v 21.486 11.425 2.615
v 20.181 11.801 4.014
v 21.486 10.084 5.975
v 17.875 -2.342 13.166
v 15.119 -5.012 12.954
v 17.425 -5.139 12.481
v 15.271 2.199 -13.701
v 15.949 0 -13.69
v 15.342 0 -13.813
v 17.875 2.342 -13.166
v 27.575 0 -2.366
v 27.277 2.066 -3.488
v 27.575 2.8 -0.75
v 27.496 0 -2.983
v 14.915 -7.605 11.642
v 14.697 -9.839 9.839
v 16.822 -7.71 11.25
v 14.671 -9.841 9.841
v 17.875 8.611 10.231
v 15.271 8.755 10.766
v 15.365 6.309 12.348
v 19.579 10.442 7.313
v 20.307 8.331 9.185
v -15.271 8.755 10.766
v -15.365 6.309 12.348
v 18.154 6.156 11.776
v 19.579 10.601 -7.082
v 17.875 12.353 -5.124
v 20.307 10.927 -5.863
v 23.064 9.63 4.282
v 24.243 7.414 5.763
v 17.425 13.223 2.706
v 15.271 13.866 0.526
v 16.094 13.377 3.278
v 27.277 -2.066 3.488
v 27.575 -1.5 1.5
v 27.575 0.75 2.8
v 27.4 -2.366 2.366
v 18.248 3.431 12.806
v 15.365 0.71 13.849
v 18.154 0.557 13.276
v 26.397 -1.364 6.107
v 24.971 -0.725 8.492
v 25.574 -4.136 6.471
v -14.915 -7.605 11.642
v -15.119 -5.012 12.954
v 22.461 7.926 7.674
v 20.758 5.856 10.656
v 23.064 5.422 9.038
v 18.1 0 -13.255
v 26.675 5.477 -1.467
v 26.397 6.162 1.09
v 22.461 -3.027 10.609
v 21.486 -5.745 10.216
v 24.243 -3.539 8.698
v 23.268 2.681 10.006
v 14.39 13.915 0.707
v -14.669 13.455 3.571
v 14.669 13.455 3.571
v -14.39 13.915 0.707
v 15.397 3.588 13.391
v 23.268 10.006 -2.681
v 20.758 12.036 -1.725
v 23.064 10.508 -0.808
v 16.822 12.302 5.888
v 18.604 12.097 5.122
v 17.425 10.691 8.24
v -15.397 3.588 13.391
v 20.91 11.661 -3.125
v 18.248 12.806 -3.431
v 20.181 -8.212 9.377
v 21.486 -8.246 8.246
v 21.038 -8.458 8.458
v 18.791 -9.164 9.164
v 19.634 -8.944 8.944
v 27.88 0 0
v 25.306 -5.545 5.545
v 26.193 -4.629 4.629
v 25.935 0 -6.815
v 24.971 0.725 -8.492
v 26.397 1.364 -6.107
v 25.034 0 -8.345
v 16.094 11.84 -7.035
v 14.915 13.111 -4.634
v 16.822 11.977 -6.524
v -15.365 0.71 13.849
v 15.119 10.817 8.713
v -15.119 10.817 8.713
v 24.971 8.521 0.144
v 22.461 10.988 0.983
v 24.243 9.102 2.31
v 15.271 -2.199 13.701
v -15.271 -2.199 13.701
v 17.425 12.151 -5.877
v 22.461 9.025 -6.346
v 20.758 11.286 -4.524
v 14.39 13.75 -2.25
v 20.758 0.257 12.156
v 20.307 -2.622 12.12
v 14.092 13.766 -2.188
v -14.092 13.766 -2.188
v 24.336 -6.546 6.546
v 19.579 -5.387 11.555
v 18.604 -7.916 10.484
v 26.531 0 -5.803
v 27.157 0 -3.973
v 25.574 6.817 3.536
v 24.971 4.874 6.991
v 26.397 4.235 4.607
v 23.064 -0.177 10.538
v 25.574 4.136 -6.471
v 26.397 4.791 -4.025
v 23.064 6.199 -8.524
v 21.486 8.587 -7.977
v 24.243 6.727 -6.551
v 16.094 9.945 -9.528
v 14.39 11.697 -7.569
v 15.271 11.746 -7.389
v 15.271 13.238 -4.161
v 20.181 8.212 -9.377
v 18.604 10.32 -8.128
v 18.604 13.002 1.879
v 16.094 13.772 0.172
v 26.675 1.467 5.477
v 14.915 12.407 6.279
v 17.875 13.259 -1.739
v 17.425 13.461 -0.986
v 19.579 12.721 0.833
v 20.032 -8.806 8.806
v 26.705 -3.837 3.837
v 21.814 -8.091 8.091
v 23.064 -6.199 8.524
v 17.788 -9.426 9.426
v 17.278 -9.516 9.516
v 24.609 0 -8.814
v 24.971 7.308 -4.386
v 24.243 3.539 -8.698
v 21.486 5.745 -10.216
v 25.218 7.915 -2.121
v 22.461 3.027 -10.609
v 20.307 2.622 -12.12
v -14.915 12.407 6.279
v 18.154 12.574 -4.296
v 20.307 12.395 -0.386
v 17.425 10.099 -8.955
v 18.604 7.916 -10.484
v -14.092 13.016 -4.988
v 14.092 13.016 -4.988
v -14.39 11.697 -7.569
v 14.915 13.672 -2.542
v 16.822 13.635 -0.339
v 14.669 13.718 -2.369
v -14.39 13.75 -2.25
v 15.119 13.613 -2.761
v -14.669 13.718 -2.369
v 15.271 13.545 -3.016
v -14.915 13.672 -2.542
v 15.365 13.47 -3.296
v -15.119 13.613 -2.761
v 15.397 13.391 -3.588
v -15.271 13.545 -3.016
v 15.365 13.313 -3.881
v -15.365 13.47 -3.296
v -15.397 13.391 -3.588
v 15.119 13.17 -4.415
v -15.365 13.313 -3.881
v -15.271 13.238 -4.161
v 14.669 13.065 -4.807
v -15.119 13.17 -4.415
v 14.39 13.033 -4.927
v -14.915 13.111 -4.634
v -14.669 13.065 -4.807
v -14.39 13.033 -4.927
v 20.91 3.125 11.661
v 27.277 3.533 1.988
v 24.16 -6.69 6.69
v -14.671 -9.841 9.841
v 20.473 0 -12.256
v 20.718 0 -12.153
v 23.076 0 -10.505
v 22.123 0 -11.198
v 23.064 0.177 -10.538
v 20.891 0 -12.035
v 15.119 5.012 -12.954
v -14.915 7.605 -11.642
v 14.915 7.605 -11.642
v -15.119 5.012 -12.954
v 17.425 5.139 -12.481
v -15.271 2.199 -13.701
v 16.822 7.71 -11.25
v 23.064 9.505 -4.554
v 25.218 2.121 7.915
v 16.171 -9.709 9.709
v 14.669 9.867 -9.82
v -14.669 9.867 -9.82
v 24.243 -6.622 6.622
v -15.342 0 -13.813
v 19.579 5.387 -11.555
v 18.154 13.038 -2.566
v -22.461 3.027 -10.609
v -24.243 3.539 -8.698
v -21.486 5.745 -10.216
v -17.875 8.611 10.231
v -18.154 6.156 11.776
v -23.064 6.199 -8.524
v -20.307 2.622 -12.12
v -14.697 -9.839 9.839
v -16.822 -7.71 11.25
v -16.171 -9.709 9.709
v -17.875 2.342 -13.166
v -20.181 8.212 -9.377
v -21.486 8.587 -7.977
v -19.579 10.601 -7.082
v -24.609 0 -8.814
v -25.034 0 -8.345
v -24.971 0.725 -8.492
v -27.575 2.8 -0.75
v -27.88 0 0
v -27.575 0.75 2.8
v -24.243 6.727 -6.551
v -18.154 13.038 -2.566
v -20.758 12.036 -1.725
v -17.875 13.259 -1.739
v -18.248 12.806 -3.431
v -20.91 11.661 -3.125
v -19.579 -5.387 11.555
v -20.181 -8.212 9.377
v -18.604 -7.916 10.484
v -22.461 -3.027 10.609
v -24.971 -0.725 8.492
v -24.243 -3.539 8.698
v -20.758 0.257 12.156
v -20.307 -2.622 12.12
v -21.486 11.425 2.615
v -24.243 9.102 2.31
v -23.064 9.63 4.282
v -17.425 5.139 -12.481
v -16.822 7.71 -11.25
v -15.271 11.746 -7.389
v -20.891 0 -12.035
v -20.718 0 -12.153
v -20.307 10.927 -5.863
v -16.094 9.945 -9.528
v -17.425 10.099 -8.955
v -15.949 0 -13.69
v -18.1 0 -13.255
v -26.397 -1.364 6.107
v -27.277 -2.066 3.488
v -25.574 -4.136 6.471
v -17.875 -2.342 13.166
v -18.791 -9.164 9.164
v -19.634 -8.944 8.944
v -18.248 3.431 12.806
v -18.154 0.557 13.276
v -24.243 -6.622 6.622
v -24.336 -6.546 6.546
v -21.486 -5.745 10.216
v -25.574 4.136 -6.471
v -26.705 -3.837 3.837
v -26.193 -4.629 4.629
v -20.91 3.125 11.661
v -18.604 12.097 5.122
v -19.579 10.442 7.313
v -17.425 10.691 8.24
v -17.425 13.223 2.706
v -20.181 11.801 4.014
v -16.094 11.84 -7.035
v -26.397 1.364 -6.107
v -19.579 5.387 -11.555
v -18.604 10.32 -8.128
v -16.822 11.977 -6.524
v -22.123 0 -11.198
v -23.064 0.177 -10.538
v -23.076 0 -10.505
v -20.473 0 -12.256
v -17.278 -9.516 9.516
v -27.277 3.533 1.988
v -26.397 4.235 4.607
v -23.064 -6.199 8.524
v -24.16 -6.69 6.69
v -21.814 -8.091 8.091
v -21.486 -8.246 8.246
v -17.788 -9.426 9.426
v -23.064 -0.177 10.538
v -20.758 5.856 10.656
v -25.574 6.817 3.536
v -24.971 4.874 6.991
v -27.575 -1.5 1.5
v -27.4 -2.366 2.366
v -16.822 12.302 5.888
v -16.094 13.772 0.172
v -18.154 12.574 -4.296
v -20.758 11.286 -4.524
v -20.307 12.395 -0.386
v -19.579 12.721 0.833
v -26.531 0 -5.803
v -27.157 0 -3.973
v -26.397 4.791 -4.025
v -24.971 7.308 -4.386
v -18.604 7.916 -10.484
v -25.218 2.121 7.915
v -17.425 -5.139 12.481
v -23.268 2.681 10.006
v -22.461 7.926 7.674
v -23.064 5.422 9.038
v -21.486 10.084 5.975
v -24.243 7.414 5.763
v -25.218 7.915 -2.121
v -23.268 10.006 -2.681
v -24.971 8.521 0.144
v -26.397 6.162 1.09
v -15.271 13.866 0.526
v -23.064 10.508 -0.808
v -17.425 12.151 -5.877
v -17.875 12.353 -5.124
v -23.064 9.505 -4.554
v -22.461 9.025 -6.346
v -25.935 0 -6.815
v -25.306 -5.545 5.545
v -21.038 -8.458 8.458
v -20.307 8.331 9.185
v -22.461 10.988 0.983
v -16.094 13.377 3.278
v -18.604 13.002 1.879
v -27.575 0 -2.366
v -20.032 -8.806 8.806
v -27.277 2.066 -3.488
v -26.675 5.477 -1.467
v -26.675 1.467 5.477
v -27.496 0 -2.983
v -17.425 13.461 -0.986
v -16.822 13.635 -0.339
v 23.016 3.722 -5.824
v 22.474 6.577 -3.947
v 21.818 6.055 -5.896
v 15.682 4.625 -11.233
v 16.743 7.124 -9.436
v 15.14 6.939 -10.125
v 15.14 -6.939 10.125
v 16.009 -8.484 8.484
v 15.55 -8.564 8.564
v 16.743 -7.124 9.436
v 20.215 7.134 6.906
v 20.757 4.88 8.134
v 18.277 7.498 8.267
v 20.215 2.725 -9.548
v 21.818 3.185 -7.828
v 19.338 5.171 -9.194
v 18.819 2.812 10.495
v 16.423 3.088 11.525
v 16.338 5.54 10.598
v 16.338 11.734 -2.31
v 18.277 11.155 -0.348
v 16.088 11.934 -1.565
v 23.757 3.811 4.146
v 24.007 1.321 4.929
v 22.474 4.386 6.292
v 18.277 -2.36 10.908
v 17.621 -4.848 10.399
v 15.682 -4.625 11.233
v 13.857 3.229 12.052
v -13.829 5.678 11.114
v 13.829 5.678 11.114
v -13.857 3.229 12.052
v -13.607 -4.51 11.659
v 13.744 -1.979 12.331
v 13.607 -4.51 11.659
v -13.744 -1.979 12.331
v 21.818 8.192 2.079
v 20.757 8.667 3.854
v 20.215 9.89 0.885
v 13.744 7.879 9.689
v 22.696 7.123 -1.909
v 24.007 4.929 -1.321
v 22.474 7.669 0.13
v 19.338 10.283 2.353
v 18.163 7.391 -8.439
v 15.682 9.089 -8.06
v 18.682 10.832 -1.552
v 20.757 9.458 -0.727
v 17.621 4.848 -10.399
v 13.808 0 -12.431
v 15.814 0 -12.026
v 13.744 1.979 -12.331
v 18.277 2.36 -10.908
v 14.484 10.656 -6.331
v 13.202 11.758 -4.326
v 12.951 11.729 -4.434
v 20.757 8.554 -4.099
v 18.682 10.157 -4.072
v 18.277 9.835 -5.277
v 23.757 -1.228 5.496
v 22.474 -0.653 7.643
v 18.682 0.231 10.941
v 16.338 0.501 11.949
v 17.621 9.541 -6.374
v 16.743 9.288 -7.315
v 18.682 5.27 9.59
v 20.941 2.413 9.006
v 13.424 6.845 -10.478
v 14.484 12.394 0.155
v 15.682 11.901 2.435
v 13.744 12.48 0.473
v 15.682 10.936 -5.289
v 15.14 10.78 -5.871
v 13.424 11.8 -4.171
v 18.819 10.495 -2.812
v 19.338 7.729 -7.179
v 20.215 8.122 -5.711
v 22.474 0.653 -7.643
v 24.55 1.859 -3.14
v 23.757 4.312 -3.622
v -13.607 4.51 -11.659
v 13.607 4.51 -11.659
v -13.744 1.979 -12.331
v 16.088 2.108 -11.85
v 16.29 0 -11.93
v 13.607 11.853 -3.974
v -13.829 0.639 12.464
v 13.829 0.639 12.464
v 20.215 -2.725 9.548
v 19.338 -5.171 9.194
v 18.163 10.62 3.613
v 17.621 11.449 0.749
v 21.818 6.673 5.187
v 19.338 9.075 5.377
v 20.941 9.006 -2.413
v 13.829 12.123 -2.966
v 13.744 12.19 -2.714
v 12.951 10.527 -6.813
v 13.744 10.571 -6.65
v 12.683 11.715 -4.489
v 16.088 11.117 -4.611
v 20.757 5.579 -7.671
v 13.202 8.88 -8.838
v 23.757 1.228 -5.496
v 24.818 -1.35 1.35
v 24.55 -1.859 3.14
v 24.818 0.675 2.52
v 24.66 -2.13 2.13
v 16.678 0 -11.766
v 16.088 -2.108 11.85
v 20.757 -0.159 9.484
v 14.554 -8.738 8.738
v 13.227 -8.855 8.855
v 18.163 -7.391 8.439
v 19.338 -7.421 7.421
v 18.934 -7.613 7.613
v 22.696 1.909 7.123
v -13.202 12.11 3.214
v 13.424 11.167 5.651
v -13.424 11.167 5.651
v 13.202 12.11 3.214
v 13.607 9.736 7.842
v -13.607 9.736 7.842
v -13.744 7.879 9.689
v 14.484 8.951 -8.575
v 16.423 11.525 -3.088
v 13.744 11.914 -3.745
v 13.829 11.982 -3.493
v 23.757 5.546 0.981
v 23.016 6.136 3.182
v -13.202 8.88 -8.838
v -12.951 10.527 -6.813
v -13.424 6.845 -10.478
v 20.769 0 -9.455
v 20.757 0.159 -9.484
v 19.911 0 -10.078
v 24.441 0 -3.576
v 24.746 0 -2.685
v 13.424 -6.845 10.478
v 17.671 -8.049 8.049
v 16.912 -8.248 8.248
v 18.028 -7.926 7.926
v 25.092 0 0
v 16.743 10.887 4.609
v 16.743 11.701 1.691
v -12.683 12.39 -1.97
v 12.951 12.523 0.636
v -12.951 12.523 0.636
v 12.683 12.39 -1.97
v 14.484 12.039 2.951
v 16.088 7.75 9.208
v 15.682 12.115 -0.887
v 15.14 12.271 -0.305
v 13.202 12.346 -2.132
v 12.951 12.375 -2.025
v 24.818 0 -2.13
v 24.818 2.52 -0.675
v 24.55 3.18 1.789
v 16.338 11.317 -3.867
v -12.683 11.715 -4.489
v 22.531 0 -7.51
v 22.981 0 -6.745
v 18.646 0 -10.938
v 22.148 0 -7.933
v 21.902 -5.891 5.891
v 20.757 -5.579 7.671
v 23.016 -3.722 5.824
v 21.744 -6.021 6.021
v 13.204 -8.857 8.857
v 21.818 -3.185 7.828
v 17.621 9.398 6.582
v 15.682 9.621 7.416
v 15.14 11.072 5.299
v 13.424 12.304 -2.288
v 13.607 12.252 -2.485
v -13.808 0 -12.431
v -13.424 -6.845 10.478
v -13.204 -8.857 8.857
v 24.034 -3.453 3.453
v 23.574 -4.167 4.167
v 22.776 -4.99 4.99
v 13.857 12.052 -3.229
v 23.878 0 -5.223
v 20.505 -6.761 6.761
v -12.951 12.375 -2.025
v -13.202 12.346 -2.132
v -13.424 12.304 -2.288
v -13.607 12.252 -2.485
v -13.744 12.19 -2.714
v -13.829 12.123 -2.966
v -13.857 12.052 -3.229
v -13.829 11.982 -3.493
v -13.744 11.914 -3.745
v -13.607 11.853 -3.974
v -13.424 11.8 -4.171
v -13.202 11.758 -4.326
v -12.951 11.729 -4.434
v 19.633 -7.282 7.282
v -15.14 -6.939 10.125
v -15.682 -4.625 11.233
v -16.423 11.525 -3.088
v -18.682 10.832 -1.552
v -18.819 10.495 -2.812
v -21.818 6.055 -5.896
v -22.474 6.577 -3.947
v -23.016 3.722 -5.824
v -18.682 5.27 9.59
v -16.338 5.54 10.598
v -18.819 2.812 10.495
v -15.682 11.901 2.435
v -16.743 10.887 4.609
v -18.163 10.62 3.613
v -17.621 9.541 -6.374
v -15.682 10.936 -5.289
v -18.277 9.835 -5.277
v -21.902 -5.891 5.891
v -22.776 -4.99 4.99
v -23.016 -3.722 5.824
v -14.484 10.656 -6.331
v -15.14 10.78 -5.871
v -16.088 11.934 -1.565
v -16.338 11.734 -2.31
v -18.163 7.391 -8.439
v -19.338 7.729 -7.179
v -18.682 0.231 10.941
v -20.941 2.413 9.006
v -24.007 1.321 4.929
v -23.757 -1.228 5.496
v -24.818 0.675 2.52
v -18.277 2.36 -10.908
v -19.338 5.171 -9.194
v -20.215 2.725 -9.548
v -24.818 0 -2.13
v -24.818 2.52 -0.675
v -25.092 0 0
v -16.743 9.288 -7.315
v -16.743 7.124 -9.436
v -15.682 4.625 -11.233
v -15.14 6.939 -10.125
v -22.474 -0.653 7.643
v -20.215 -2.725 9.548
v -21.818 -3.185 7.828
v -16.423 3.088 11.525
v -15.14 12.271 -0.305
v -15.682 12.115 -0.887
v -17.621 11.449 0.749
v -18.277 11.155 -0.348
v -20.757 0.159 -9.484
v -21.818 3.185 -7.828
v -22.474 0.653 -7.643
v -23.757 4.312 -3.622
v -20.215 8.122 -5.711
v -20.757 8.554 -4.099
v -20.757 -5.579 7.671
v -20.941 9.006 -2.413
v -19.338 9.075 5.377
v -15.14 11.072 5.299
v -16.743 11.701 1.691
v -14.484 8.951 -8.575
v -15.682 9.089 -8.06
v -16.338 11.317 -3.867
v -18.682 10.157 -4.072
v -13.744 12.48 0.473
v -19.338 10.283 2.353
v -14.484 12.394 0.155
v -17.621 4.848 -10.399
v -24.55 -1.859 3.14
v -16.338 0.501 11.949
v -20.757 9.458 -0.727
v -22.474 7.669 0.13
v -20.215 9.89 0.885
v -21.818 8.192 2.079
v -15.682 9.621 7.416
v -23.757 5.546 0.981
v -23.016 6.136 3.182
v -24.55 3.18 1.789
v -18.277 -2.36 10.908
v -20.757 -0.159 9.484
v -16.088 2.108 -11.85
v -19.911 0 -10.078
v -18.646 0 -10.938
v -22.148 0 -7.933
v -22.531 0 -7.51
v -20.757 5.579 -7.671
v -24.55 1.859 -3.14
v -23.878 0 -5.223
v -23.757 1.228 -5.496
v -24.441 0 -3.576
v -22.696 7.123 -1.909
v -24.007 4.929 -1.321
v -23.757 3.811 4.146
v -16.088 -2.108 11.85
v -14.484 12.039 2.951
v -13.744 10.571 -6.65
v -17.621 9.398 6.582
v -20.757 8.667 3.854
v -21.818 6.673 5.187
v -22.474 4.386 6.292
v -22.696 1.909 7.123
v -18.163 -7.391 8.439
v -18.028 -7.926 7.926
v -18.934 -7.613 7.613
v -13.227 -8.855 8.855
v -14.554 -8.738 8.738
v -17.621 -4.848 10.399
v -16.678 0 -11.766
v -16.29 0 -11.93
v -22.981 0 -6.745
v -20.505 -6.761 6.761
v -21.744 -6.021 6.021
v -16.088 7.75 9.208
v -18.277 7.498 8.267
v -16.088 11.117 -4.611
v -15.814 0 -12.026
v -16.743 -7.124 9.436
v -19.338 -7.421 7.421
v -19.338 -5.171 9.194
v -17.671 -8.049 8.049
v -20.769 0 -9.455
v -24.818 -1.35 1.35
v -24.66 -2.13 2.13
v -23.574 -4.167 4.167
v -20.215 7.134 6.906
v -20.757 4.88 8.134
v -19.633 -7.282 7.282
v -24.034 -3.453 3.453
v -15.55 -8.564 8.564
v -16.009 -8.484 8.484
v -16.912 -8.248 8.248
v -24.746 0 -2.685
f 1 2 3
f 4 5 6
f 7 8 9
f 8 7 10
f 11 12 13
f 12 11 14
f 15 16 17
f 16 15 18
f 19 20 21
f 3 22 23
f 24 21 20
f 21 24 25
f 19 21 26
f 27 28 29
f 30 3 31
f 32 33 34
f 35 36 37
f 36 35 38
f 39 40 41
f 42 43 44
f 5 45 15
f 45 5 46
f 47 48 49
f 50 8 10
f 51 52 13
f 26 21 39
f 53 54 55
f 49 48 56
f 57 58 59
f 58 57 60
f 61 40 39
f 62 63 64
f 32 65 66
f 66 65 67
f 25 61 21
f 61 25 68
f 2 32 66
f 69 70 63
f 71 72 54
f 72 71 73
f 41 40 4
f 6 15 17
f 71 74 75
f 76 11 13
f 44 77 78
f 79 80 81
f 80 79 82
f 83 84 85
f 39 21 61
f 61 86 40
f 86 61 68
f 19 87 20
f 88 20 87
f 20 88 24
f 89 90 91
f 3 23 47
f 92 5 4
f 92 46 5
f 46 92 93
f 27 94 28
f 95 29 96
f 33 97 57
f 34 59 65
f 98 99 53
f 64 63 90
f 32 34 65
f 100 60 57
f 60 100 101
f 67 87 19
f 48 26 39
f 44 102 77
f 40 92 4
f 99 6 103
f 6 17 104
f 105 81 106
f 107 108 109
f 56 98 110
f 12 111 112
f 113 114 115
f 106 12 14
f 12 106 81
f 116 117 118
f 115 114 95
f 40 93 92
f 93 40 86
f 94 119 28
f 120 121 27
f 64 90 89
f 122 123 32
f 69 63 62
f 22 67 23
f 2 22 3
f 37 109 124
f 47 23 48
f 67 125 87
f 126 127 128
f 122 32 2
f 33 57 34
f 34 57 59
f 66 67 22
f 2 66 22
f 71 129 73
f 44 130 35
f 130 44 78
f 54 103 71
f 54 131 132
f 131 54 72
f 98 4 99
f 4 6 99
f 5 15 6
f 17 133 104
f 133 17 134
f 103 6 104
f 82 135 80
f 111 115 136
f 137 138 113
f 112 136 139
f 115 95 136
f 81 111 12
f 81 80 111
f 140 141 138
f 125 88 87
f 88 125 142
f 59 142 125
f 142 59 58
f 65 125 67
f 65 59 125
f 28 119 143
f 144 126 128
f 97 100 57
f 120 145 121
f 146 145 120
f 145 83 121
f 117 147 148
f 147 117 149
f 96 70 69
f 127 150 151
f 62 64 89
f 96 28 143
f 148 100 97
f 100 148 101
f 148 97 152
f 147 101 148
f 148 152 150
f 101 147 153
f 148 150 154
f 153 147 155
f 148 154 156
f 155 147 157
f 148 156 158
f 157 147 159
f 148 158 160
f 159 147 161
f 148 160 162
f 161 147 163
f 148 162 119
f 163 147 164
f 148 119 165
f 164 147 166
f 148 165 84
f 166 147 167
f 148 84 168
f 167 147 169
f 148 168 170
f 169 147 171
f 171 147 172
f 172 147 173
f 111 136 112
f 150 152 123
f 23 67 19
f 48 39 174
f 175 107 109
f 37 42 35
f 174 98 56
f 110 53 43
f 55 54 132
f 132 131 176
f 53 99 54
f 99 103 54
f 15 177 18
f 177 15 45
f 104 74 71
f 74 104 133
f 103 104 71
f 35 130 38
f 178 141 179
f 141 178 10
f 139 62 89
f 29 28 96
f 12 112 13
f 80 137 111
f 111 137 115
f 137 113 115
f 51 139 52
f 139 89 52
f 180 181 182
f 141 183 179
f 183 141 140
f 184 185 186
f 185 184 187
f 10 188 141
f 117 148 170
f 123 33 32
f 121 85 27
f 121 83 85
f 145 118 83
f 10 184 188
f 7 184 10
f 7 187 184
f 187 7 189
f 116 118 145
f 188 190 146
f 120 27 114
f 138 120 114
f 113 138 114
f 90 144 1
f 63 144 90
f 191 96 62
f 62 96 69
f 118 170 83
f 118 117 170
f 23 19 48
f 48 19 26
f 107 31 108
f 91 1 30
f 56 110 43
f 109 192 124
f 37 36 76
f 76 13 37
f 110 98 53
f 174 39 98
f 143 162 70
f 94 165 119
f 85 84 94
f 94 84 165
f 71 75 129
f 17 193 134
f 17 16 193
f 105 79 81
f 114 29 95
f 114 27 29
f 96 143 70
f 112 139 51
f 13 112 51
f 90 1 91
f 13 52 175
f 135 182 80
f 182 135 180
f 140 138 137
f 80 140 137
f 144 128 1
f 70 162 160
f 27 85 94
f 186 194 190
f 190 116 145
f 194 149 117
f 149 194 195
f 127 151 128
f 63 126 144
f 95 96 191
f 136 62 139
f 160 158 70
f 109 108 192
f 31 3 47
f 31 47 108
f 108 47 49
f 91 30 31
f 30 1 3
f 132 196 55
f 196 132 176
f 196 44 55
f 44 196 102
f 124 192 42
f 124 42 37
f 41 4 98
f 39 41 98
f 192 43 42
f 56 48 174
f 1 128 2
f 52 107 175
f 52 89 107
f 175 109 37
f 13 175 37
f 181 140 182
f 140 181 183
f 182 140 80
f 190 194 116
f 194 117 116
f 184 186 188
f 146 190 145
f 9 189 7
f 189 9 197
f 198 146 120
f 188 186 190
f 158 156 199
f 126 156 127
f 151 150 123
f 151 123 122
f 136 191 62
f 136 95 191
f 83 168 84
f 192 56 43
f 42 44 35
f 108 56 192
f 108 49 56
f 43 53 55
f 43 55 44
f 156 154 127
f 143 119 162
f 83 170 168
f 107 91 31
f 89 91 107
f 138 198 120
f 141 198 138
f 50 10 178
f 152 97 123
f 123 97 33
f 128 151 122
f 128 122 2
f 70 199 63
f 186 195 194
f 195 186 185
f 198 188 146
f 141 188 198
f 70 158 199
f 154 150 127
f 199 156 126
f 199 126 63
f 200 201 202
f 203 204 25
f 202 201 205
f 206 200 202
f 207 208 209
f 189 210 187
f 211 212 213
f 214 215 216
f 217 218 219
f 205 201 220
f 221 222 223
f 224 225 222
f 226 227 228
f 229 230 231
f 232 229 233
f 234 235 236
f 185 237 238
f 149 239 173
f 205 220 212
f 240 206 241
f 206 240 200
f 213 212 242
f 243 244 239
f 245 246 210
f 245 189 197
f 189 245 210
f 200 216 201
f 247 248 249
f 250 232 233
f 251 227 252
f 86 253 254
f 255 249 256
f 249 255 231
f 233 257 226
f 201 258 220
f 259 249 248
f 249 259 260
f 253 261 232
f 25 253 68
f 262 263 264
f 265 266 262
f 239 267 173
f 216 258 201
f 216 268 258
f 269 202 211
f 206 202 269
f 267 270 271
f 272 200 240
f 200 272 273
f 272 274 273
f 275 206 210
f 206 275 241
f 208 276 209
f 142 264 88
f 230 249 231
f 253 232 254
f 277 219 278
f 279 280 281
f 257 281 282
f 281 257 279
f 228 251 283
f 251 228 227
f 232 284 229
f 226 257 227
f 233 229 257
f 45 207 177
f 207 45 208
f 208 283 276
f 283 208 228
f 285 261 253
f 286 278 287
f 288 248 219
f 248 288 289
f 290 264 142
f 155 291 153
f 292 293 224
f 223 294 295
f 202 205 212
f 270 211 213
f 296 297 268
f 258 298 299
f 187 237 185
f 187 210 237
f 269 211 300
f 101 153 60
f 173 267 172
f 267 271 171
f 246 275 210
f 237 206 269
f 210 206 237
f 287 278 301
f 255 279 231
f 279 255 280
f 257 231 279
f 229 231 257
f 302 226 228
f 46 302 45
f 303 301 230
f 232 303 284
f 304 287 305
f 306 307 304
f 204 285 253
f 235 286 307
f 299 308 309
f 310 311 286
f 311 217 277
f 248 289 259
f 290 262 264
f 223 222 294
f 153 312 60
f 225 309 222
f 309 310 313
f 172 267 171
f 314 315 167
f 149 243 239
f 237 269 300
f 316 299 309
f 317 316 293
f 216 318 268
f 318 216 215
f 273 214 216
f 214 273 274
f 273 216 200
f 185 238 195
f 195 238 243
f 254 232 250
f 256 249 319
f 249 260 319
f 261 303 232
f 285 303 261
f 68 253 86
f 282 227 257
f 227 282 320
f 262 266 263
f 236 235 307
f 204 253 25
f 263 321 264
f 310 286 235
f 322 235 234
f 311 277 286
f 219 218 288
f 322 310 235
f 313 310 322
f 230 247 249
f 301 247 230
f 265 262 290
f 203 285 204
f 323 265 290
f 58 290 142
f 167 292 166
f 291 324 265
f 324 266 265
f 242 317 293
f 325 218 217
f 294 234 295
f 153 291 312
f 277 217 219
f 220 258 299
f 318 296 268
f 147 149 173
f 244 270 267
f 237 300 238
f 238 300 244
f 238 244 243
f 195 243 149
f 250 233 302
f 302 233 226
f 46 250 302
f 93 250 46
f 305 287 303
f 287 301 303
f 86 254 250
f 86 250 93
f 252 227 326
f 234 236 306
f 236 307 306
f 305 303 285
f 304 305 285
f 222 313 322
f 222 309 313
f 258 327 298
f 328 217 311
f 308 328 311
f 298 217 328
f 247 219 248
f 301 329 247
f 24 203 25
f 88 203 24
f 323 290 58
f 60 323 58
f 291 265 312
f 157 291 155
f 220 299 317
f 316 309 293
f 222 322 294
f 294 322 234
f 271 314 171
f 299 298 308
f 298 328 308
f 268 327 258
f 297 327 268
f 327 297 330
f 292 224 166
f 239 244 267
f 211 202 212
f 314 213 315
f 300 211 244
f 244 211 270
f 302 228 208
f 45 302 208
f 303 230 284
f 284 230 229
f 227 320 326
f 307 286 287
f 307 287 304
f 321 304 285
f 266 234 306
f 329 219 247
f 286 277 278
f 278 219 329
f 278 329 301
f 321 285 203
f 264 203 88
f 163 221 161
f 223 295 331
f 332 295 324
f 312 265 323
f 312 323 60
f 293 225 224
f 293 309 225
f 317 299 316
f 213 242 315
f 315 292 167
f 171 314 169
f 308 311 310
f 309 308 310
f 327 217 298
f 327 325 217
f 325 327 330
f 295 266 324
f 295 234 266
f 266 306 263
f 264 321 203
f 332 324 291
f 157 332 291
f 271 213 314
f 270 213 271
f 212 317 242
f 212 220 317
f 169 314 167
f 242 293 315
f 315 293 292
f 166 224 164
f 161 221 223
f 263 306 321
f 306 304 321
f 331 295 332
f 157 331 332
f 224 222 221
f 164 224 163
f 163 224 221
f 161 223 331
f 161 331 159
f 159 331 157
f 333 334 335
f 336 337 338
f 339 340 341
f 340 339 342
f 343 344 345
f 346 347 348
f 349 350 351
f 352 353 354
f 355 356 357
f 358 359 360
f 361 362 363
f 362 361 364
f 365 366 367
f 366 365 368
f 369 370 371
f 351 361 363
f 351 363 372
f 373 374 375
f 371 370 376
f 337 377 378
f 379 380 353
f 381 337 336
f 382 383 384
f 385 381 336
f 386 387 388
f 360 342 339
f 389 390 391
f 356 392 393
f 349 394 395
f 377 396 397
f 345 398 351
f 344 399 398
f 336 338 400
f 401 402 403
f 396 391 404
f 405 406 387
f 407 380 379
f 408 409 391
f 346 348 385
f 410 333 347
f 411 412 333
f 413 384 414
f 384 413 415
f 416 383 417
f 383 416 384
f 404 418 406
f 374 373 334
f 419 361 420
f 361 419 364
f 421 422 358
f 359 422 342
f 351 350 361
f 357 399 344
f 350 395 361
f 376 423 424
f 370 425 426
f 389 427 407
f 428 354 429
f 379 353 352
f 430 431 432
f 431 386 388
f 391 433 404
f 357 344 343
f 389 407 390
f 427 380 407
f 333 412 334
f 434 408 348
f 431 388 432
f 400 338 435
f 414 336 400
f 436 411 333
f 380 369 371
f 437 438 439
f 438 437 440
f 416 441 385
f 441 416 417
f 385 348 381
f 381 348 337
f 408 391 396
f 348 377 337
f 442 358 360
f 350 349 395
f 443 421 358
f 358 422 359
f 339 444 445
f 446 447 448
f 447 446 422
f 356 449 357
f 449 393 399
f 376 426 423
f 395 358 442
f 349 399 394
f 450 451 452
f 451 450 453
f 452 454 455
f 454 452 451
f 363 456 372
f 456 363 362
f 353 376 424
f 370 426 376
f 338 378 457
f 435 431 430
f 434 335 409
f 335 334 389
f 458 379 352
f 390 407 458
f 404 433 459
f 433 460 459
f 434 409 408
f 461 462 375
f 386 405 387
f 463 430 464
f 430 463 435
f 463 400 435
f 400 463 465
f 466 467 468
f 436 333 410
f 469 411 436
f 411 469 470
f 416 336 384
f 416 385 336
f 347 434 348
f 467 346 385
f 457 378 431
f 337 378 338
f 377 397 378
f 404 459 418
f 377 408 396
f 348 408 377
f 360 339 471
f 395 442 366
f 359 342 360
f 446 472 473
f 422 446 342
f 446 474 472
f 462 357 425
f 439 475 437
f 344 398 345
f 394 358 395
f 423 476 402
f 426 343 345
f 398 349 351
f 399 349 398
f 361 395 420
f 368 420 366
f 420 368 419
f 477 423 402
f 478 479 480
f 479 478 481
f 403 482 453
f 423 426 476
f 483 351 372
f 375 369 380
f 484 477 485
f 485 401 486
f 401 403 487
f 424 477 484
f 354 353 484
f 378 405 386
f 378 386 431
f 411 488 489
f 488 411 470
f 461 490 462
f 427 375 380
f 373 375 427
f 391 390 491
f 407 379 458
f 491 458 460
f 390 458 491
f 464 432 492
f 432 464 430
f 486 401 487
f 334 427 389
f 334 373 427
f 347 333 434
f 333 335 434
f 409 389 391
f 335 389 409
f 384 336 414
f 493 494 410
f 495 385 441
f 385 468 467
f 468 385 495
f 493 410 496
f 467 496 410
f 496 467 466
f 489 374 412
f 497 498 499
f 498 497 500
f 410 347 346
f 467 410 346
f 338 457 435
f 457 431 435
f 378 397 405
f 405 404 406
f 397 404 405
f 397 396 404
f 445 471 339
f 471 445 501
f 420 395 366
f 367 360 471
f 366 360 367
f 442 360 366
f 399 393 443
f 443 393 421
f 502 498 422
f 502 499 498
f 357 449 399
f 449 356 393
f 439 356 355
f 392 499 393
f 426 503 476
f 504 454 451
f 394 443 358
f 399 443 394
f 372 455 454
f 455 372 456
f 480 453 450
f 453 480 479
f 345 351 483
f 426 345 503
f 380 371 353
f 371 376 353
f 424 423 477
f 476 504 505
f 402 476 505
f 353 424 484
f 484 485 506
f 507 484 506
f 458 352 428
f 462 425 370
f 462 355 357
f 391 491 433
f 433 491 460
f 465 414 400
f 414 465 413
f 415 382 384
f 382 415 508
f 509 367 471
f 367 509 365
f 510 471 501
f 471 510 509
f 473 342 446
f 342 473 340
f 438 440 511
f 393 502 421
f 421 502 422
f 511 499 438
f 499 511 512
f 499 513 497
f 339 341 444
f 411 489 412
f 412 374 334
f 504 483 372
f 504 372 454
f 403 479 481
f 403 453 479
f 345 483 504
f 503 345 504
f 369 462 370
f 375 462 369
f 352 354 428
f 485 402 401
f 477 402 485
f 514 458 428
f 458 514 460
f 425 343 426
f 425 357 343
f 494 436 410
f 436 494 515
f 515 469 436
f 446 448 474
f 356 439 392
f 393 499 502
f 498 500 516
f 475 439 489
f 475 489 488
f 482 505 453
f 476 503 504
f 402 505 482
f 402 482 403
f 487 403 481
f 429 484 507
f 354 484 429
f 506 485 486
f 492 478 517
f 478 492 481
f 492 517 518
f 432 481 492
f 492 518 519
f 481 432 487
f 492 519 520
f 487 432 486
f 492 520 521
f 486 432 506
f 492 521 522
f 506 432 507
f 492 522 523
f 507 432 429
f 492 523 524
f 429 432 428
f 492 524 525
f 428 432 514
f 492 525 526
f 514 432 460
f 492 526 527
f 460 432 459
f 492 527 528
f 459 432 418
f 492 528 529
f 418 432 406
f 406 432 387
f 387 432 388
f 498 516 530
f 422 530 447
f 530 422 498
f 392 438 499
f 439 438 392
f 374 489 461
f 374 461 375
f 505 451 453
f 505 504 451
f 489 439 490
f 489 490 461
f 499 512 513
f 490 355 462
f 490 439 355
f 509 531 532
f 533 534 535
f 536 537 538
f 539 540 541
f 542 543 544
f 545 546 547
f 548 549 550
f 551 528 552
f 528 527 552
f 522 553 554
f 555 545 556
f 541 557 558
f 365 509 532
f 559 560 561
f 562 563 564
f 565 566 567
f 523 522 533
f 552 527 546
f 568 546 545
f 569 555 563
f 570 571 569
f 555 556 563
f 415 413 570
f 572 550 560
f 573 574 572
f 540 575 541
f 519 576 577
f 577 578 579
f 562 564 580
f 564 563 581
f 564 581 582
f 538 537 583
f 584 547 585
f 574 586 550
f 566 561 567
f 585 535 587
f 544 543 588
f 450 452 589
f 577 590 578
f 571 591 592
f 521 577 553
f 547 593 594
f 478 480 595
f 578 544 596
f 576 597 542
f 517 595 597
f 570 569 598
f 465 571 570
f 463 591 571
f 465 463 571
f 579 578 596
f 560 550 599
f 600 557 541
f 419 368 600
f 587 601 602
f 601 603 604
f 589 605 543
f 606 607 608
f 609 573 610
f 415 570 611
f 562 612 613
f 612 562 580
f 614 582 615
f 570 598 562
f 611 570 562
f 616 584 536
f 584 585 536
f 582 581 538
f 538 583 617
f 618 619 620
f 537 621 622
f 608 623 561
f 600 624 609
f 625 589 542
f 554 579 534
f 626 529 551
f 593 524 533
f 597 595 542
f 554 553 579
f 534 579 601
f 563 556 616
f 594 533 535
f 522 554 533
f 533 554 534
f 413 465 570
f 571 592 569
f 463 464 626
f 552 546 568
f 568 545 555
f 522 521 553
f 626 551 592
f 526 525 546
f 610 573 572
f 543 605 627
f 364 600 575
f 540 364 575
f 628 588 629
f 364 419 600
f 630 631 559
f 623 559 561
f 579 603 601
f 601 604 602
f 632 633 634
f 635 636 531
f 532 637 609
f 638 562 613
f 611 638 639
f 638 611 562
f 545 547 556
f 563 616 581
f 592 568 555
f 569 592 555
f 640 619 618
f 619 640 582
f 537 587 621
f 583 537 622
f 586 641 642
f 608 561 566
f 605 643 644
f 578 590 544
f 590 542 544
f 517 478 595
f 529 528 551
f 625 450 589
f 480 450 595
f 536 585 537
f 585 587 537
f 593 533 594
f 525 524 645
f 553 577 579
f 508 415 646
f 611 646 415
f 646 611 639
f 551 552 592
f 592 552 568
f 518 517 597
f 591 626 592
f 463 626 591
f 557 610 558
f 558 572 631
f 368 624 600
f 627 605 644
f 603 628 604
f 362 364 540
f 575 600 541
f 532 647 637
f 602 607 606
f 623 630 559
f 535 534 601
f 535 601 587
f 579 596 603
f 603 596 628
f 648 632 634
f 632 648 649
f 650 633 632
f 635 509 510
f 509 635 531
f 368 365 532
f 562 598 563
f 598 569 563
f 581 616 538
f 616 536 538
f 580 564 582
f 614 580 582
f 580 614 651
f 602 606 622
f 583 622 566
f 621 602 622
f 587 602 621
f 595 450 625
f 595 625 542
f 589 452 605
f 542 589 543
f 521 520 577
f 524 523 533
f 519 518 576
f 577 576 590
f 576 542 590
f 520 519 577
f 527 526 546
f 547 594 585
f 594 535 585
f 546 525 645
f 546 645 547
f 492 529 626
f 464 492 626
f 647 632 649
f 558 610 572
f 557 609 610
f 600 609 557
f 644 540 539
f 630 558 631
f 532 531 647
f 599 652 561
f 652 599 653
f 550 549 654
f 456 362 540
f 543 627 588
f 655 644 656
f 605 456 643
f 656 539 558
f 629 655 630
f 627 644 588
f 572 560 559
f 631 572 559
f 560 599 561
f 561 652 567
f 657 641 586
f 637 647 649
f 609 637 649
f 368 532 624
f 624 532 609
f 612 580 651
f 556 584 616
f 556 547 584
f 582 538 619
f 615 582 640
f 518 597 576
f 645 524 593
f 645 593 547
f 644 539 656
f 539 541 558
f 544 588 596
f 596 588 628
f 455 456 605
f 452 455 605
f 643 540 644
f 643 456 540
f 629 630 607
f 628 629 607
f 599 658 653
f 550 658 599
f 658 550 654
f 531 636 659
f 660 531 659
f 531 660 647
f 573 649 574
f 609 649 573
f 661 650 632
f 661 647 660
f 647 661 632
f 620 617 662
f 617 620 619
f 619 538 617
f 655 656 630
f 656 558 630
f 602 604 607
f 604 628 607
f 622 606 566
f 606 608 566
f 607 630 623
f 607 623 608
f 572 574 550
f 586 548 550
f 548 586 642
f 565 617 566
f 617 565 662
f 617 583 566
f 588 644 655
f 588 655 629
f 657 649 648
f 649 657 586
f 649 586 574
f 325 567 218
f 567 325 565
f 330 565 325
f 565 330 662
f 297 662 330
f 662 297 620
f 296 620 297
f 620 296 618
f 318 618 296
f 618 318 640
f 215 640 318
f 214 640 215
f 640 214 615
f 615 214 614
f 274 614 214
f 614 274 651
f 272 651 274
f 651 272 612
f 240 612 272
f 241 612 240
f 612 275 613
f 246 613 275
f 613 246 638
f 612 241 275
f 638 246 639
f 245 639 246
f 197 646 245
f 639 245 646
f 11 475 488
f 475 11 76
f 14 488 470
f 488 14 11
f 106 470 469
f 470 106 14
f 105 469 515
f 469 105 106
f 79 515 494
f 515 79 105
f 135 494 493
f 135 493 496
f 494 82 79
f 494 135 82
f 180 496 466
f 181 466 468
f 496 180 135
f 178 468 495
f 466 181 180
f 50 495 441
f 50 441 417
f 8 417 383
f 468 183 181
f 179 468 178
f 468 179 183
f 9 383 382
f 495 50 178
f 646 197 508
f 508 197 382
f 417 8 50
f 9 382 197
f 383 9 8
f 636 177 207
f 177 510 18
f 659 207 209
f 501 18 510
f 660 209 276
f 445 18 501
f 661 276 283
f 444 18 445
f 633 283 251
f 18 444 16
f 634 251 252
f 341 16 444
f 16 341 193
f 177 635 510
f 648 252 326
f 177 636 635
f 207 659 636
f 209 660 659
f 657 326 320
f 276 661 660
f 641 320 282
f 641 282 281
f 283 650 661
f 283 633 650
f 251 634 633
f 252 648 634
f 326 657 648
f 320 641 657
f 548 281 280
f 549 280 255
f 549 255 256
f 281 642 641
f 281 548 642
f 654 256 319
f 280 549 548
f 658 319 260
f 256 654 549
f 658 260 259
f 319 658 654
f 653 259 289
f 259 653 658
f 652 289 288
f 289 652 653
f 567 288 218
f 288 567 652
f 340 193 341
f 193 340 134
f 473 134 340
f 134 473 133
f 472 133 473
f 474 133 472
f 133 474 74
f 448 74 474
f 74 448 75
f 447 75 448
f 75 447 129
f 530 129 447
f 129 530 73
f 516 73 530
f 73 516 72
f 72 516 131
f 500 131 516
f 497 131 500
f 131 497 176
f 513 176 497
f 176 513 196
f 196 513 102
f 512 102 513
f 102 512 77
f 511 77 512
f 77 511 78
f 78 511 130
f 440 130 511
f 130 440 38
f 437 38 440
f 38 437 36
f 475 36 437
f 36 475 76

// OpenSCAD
// file: 3dprinter.scad
//===============================================//
//===============================================//
//     BioDeploy SCAD file = 3dprinter.scad      //
//                 Start File                    //
//===============================================//
//===============================================//
//choose the max specs for your 3d printer
//here we use a replicator2x specs
x_print_max = 24.6*10;
y_print_max = 15.2*10;
z_print_max = 15.5*10;
//don't forget *10 to put unit in centimeters
//-----------------------------------------------//
//===============================================//
//===============================================//
//     BioDeploy SCAD file = 3dprinter.scad      //
//                   End  File                   //
//===============================================//
//===============================================//
// main file
//===============================================//
//===============================================//
//BioDeploy SCAD file = hydrolyseur_top_grip.scad//
//                 Start File                    //
//===============================================//
//===============================================//
//-----------------------------------------------//
//===============================================//
//             3d printer parameters             //
//===============================================//
include <3dprinter.scad>
//===============================================//
//                 variables                     //
//===============================================//
include <hydrolyseur_variables.scad>
//===============================================//
//               Calls for use                   //
//===============================================//


//===============================================//
//                    Trees                      //
//===============================================//
 module topogrip()
{
rotate([45,0,0])translate([-x_h2o_box_int/6,0,0])rotate([60,0,0])cube([x_h2o_box_int/2,y_h2o_box_int/1,z_h2o_box_int/5]);
translate([-x_h2o_box_int/6,0,0])rotate([60,0,0])cube([x_h2o_box_int/2,y_h2o_box_int/1,z_h2o_box_int/5]);
}


module gripsmoothtop()
{union(){
hull(){
sphere(x_h2o_box_int/15, center=true);
translate([x_h2o_box_int/15,0,0])sphere(x_h2o_box_int/15, center=true);}

hull(){
sphere(x_h2o_box_int/15, center=true);
translate([-x_h2o_box_int/15,0,0])sphere(x_h2o_box_int/15, center=true);}
}}

module gripsmoothtop_int()
{union(){
hull(){
sphere(x_h2o_box_int_grip/15, center=true);
translate([x_h2o_box_int_grip/15,0,0])sphere(x_h2o_box_int_grip/15, center=true);}

hull(){
sphere(x_h2o_box_int_grip/15, center=true);
translate([-x_h2o_box_int_grip/15,0,0])sphere(x_h2o_box_int_grip/15, center=true);}
}
}
module cutgriptop() {
difference() {
gripsmoothtop();
gripsmoothtop_int();
}}

module griptopfull() {
difference() {
cutgriptop();
topogrip();
}}

module griptopfull2() {
rotate([75,0,0])griptopfull();
}

griptopfull2();

//-----------------------------------------------//
//===============================================//
//===============================================//
//BioDeploy SCAD file = hydrolyseur_top_grip.scad//
//                   End  File                   //
//===============================================//
//===============================================//
